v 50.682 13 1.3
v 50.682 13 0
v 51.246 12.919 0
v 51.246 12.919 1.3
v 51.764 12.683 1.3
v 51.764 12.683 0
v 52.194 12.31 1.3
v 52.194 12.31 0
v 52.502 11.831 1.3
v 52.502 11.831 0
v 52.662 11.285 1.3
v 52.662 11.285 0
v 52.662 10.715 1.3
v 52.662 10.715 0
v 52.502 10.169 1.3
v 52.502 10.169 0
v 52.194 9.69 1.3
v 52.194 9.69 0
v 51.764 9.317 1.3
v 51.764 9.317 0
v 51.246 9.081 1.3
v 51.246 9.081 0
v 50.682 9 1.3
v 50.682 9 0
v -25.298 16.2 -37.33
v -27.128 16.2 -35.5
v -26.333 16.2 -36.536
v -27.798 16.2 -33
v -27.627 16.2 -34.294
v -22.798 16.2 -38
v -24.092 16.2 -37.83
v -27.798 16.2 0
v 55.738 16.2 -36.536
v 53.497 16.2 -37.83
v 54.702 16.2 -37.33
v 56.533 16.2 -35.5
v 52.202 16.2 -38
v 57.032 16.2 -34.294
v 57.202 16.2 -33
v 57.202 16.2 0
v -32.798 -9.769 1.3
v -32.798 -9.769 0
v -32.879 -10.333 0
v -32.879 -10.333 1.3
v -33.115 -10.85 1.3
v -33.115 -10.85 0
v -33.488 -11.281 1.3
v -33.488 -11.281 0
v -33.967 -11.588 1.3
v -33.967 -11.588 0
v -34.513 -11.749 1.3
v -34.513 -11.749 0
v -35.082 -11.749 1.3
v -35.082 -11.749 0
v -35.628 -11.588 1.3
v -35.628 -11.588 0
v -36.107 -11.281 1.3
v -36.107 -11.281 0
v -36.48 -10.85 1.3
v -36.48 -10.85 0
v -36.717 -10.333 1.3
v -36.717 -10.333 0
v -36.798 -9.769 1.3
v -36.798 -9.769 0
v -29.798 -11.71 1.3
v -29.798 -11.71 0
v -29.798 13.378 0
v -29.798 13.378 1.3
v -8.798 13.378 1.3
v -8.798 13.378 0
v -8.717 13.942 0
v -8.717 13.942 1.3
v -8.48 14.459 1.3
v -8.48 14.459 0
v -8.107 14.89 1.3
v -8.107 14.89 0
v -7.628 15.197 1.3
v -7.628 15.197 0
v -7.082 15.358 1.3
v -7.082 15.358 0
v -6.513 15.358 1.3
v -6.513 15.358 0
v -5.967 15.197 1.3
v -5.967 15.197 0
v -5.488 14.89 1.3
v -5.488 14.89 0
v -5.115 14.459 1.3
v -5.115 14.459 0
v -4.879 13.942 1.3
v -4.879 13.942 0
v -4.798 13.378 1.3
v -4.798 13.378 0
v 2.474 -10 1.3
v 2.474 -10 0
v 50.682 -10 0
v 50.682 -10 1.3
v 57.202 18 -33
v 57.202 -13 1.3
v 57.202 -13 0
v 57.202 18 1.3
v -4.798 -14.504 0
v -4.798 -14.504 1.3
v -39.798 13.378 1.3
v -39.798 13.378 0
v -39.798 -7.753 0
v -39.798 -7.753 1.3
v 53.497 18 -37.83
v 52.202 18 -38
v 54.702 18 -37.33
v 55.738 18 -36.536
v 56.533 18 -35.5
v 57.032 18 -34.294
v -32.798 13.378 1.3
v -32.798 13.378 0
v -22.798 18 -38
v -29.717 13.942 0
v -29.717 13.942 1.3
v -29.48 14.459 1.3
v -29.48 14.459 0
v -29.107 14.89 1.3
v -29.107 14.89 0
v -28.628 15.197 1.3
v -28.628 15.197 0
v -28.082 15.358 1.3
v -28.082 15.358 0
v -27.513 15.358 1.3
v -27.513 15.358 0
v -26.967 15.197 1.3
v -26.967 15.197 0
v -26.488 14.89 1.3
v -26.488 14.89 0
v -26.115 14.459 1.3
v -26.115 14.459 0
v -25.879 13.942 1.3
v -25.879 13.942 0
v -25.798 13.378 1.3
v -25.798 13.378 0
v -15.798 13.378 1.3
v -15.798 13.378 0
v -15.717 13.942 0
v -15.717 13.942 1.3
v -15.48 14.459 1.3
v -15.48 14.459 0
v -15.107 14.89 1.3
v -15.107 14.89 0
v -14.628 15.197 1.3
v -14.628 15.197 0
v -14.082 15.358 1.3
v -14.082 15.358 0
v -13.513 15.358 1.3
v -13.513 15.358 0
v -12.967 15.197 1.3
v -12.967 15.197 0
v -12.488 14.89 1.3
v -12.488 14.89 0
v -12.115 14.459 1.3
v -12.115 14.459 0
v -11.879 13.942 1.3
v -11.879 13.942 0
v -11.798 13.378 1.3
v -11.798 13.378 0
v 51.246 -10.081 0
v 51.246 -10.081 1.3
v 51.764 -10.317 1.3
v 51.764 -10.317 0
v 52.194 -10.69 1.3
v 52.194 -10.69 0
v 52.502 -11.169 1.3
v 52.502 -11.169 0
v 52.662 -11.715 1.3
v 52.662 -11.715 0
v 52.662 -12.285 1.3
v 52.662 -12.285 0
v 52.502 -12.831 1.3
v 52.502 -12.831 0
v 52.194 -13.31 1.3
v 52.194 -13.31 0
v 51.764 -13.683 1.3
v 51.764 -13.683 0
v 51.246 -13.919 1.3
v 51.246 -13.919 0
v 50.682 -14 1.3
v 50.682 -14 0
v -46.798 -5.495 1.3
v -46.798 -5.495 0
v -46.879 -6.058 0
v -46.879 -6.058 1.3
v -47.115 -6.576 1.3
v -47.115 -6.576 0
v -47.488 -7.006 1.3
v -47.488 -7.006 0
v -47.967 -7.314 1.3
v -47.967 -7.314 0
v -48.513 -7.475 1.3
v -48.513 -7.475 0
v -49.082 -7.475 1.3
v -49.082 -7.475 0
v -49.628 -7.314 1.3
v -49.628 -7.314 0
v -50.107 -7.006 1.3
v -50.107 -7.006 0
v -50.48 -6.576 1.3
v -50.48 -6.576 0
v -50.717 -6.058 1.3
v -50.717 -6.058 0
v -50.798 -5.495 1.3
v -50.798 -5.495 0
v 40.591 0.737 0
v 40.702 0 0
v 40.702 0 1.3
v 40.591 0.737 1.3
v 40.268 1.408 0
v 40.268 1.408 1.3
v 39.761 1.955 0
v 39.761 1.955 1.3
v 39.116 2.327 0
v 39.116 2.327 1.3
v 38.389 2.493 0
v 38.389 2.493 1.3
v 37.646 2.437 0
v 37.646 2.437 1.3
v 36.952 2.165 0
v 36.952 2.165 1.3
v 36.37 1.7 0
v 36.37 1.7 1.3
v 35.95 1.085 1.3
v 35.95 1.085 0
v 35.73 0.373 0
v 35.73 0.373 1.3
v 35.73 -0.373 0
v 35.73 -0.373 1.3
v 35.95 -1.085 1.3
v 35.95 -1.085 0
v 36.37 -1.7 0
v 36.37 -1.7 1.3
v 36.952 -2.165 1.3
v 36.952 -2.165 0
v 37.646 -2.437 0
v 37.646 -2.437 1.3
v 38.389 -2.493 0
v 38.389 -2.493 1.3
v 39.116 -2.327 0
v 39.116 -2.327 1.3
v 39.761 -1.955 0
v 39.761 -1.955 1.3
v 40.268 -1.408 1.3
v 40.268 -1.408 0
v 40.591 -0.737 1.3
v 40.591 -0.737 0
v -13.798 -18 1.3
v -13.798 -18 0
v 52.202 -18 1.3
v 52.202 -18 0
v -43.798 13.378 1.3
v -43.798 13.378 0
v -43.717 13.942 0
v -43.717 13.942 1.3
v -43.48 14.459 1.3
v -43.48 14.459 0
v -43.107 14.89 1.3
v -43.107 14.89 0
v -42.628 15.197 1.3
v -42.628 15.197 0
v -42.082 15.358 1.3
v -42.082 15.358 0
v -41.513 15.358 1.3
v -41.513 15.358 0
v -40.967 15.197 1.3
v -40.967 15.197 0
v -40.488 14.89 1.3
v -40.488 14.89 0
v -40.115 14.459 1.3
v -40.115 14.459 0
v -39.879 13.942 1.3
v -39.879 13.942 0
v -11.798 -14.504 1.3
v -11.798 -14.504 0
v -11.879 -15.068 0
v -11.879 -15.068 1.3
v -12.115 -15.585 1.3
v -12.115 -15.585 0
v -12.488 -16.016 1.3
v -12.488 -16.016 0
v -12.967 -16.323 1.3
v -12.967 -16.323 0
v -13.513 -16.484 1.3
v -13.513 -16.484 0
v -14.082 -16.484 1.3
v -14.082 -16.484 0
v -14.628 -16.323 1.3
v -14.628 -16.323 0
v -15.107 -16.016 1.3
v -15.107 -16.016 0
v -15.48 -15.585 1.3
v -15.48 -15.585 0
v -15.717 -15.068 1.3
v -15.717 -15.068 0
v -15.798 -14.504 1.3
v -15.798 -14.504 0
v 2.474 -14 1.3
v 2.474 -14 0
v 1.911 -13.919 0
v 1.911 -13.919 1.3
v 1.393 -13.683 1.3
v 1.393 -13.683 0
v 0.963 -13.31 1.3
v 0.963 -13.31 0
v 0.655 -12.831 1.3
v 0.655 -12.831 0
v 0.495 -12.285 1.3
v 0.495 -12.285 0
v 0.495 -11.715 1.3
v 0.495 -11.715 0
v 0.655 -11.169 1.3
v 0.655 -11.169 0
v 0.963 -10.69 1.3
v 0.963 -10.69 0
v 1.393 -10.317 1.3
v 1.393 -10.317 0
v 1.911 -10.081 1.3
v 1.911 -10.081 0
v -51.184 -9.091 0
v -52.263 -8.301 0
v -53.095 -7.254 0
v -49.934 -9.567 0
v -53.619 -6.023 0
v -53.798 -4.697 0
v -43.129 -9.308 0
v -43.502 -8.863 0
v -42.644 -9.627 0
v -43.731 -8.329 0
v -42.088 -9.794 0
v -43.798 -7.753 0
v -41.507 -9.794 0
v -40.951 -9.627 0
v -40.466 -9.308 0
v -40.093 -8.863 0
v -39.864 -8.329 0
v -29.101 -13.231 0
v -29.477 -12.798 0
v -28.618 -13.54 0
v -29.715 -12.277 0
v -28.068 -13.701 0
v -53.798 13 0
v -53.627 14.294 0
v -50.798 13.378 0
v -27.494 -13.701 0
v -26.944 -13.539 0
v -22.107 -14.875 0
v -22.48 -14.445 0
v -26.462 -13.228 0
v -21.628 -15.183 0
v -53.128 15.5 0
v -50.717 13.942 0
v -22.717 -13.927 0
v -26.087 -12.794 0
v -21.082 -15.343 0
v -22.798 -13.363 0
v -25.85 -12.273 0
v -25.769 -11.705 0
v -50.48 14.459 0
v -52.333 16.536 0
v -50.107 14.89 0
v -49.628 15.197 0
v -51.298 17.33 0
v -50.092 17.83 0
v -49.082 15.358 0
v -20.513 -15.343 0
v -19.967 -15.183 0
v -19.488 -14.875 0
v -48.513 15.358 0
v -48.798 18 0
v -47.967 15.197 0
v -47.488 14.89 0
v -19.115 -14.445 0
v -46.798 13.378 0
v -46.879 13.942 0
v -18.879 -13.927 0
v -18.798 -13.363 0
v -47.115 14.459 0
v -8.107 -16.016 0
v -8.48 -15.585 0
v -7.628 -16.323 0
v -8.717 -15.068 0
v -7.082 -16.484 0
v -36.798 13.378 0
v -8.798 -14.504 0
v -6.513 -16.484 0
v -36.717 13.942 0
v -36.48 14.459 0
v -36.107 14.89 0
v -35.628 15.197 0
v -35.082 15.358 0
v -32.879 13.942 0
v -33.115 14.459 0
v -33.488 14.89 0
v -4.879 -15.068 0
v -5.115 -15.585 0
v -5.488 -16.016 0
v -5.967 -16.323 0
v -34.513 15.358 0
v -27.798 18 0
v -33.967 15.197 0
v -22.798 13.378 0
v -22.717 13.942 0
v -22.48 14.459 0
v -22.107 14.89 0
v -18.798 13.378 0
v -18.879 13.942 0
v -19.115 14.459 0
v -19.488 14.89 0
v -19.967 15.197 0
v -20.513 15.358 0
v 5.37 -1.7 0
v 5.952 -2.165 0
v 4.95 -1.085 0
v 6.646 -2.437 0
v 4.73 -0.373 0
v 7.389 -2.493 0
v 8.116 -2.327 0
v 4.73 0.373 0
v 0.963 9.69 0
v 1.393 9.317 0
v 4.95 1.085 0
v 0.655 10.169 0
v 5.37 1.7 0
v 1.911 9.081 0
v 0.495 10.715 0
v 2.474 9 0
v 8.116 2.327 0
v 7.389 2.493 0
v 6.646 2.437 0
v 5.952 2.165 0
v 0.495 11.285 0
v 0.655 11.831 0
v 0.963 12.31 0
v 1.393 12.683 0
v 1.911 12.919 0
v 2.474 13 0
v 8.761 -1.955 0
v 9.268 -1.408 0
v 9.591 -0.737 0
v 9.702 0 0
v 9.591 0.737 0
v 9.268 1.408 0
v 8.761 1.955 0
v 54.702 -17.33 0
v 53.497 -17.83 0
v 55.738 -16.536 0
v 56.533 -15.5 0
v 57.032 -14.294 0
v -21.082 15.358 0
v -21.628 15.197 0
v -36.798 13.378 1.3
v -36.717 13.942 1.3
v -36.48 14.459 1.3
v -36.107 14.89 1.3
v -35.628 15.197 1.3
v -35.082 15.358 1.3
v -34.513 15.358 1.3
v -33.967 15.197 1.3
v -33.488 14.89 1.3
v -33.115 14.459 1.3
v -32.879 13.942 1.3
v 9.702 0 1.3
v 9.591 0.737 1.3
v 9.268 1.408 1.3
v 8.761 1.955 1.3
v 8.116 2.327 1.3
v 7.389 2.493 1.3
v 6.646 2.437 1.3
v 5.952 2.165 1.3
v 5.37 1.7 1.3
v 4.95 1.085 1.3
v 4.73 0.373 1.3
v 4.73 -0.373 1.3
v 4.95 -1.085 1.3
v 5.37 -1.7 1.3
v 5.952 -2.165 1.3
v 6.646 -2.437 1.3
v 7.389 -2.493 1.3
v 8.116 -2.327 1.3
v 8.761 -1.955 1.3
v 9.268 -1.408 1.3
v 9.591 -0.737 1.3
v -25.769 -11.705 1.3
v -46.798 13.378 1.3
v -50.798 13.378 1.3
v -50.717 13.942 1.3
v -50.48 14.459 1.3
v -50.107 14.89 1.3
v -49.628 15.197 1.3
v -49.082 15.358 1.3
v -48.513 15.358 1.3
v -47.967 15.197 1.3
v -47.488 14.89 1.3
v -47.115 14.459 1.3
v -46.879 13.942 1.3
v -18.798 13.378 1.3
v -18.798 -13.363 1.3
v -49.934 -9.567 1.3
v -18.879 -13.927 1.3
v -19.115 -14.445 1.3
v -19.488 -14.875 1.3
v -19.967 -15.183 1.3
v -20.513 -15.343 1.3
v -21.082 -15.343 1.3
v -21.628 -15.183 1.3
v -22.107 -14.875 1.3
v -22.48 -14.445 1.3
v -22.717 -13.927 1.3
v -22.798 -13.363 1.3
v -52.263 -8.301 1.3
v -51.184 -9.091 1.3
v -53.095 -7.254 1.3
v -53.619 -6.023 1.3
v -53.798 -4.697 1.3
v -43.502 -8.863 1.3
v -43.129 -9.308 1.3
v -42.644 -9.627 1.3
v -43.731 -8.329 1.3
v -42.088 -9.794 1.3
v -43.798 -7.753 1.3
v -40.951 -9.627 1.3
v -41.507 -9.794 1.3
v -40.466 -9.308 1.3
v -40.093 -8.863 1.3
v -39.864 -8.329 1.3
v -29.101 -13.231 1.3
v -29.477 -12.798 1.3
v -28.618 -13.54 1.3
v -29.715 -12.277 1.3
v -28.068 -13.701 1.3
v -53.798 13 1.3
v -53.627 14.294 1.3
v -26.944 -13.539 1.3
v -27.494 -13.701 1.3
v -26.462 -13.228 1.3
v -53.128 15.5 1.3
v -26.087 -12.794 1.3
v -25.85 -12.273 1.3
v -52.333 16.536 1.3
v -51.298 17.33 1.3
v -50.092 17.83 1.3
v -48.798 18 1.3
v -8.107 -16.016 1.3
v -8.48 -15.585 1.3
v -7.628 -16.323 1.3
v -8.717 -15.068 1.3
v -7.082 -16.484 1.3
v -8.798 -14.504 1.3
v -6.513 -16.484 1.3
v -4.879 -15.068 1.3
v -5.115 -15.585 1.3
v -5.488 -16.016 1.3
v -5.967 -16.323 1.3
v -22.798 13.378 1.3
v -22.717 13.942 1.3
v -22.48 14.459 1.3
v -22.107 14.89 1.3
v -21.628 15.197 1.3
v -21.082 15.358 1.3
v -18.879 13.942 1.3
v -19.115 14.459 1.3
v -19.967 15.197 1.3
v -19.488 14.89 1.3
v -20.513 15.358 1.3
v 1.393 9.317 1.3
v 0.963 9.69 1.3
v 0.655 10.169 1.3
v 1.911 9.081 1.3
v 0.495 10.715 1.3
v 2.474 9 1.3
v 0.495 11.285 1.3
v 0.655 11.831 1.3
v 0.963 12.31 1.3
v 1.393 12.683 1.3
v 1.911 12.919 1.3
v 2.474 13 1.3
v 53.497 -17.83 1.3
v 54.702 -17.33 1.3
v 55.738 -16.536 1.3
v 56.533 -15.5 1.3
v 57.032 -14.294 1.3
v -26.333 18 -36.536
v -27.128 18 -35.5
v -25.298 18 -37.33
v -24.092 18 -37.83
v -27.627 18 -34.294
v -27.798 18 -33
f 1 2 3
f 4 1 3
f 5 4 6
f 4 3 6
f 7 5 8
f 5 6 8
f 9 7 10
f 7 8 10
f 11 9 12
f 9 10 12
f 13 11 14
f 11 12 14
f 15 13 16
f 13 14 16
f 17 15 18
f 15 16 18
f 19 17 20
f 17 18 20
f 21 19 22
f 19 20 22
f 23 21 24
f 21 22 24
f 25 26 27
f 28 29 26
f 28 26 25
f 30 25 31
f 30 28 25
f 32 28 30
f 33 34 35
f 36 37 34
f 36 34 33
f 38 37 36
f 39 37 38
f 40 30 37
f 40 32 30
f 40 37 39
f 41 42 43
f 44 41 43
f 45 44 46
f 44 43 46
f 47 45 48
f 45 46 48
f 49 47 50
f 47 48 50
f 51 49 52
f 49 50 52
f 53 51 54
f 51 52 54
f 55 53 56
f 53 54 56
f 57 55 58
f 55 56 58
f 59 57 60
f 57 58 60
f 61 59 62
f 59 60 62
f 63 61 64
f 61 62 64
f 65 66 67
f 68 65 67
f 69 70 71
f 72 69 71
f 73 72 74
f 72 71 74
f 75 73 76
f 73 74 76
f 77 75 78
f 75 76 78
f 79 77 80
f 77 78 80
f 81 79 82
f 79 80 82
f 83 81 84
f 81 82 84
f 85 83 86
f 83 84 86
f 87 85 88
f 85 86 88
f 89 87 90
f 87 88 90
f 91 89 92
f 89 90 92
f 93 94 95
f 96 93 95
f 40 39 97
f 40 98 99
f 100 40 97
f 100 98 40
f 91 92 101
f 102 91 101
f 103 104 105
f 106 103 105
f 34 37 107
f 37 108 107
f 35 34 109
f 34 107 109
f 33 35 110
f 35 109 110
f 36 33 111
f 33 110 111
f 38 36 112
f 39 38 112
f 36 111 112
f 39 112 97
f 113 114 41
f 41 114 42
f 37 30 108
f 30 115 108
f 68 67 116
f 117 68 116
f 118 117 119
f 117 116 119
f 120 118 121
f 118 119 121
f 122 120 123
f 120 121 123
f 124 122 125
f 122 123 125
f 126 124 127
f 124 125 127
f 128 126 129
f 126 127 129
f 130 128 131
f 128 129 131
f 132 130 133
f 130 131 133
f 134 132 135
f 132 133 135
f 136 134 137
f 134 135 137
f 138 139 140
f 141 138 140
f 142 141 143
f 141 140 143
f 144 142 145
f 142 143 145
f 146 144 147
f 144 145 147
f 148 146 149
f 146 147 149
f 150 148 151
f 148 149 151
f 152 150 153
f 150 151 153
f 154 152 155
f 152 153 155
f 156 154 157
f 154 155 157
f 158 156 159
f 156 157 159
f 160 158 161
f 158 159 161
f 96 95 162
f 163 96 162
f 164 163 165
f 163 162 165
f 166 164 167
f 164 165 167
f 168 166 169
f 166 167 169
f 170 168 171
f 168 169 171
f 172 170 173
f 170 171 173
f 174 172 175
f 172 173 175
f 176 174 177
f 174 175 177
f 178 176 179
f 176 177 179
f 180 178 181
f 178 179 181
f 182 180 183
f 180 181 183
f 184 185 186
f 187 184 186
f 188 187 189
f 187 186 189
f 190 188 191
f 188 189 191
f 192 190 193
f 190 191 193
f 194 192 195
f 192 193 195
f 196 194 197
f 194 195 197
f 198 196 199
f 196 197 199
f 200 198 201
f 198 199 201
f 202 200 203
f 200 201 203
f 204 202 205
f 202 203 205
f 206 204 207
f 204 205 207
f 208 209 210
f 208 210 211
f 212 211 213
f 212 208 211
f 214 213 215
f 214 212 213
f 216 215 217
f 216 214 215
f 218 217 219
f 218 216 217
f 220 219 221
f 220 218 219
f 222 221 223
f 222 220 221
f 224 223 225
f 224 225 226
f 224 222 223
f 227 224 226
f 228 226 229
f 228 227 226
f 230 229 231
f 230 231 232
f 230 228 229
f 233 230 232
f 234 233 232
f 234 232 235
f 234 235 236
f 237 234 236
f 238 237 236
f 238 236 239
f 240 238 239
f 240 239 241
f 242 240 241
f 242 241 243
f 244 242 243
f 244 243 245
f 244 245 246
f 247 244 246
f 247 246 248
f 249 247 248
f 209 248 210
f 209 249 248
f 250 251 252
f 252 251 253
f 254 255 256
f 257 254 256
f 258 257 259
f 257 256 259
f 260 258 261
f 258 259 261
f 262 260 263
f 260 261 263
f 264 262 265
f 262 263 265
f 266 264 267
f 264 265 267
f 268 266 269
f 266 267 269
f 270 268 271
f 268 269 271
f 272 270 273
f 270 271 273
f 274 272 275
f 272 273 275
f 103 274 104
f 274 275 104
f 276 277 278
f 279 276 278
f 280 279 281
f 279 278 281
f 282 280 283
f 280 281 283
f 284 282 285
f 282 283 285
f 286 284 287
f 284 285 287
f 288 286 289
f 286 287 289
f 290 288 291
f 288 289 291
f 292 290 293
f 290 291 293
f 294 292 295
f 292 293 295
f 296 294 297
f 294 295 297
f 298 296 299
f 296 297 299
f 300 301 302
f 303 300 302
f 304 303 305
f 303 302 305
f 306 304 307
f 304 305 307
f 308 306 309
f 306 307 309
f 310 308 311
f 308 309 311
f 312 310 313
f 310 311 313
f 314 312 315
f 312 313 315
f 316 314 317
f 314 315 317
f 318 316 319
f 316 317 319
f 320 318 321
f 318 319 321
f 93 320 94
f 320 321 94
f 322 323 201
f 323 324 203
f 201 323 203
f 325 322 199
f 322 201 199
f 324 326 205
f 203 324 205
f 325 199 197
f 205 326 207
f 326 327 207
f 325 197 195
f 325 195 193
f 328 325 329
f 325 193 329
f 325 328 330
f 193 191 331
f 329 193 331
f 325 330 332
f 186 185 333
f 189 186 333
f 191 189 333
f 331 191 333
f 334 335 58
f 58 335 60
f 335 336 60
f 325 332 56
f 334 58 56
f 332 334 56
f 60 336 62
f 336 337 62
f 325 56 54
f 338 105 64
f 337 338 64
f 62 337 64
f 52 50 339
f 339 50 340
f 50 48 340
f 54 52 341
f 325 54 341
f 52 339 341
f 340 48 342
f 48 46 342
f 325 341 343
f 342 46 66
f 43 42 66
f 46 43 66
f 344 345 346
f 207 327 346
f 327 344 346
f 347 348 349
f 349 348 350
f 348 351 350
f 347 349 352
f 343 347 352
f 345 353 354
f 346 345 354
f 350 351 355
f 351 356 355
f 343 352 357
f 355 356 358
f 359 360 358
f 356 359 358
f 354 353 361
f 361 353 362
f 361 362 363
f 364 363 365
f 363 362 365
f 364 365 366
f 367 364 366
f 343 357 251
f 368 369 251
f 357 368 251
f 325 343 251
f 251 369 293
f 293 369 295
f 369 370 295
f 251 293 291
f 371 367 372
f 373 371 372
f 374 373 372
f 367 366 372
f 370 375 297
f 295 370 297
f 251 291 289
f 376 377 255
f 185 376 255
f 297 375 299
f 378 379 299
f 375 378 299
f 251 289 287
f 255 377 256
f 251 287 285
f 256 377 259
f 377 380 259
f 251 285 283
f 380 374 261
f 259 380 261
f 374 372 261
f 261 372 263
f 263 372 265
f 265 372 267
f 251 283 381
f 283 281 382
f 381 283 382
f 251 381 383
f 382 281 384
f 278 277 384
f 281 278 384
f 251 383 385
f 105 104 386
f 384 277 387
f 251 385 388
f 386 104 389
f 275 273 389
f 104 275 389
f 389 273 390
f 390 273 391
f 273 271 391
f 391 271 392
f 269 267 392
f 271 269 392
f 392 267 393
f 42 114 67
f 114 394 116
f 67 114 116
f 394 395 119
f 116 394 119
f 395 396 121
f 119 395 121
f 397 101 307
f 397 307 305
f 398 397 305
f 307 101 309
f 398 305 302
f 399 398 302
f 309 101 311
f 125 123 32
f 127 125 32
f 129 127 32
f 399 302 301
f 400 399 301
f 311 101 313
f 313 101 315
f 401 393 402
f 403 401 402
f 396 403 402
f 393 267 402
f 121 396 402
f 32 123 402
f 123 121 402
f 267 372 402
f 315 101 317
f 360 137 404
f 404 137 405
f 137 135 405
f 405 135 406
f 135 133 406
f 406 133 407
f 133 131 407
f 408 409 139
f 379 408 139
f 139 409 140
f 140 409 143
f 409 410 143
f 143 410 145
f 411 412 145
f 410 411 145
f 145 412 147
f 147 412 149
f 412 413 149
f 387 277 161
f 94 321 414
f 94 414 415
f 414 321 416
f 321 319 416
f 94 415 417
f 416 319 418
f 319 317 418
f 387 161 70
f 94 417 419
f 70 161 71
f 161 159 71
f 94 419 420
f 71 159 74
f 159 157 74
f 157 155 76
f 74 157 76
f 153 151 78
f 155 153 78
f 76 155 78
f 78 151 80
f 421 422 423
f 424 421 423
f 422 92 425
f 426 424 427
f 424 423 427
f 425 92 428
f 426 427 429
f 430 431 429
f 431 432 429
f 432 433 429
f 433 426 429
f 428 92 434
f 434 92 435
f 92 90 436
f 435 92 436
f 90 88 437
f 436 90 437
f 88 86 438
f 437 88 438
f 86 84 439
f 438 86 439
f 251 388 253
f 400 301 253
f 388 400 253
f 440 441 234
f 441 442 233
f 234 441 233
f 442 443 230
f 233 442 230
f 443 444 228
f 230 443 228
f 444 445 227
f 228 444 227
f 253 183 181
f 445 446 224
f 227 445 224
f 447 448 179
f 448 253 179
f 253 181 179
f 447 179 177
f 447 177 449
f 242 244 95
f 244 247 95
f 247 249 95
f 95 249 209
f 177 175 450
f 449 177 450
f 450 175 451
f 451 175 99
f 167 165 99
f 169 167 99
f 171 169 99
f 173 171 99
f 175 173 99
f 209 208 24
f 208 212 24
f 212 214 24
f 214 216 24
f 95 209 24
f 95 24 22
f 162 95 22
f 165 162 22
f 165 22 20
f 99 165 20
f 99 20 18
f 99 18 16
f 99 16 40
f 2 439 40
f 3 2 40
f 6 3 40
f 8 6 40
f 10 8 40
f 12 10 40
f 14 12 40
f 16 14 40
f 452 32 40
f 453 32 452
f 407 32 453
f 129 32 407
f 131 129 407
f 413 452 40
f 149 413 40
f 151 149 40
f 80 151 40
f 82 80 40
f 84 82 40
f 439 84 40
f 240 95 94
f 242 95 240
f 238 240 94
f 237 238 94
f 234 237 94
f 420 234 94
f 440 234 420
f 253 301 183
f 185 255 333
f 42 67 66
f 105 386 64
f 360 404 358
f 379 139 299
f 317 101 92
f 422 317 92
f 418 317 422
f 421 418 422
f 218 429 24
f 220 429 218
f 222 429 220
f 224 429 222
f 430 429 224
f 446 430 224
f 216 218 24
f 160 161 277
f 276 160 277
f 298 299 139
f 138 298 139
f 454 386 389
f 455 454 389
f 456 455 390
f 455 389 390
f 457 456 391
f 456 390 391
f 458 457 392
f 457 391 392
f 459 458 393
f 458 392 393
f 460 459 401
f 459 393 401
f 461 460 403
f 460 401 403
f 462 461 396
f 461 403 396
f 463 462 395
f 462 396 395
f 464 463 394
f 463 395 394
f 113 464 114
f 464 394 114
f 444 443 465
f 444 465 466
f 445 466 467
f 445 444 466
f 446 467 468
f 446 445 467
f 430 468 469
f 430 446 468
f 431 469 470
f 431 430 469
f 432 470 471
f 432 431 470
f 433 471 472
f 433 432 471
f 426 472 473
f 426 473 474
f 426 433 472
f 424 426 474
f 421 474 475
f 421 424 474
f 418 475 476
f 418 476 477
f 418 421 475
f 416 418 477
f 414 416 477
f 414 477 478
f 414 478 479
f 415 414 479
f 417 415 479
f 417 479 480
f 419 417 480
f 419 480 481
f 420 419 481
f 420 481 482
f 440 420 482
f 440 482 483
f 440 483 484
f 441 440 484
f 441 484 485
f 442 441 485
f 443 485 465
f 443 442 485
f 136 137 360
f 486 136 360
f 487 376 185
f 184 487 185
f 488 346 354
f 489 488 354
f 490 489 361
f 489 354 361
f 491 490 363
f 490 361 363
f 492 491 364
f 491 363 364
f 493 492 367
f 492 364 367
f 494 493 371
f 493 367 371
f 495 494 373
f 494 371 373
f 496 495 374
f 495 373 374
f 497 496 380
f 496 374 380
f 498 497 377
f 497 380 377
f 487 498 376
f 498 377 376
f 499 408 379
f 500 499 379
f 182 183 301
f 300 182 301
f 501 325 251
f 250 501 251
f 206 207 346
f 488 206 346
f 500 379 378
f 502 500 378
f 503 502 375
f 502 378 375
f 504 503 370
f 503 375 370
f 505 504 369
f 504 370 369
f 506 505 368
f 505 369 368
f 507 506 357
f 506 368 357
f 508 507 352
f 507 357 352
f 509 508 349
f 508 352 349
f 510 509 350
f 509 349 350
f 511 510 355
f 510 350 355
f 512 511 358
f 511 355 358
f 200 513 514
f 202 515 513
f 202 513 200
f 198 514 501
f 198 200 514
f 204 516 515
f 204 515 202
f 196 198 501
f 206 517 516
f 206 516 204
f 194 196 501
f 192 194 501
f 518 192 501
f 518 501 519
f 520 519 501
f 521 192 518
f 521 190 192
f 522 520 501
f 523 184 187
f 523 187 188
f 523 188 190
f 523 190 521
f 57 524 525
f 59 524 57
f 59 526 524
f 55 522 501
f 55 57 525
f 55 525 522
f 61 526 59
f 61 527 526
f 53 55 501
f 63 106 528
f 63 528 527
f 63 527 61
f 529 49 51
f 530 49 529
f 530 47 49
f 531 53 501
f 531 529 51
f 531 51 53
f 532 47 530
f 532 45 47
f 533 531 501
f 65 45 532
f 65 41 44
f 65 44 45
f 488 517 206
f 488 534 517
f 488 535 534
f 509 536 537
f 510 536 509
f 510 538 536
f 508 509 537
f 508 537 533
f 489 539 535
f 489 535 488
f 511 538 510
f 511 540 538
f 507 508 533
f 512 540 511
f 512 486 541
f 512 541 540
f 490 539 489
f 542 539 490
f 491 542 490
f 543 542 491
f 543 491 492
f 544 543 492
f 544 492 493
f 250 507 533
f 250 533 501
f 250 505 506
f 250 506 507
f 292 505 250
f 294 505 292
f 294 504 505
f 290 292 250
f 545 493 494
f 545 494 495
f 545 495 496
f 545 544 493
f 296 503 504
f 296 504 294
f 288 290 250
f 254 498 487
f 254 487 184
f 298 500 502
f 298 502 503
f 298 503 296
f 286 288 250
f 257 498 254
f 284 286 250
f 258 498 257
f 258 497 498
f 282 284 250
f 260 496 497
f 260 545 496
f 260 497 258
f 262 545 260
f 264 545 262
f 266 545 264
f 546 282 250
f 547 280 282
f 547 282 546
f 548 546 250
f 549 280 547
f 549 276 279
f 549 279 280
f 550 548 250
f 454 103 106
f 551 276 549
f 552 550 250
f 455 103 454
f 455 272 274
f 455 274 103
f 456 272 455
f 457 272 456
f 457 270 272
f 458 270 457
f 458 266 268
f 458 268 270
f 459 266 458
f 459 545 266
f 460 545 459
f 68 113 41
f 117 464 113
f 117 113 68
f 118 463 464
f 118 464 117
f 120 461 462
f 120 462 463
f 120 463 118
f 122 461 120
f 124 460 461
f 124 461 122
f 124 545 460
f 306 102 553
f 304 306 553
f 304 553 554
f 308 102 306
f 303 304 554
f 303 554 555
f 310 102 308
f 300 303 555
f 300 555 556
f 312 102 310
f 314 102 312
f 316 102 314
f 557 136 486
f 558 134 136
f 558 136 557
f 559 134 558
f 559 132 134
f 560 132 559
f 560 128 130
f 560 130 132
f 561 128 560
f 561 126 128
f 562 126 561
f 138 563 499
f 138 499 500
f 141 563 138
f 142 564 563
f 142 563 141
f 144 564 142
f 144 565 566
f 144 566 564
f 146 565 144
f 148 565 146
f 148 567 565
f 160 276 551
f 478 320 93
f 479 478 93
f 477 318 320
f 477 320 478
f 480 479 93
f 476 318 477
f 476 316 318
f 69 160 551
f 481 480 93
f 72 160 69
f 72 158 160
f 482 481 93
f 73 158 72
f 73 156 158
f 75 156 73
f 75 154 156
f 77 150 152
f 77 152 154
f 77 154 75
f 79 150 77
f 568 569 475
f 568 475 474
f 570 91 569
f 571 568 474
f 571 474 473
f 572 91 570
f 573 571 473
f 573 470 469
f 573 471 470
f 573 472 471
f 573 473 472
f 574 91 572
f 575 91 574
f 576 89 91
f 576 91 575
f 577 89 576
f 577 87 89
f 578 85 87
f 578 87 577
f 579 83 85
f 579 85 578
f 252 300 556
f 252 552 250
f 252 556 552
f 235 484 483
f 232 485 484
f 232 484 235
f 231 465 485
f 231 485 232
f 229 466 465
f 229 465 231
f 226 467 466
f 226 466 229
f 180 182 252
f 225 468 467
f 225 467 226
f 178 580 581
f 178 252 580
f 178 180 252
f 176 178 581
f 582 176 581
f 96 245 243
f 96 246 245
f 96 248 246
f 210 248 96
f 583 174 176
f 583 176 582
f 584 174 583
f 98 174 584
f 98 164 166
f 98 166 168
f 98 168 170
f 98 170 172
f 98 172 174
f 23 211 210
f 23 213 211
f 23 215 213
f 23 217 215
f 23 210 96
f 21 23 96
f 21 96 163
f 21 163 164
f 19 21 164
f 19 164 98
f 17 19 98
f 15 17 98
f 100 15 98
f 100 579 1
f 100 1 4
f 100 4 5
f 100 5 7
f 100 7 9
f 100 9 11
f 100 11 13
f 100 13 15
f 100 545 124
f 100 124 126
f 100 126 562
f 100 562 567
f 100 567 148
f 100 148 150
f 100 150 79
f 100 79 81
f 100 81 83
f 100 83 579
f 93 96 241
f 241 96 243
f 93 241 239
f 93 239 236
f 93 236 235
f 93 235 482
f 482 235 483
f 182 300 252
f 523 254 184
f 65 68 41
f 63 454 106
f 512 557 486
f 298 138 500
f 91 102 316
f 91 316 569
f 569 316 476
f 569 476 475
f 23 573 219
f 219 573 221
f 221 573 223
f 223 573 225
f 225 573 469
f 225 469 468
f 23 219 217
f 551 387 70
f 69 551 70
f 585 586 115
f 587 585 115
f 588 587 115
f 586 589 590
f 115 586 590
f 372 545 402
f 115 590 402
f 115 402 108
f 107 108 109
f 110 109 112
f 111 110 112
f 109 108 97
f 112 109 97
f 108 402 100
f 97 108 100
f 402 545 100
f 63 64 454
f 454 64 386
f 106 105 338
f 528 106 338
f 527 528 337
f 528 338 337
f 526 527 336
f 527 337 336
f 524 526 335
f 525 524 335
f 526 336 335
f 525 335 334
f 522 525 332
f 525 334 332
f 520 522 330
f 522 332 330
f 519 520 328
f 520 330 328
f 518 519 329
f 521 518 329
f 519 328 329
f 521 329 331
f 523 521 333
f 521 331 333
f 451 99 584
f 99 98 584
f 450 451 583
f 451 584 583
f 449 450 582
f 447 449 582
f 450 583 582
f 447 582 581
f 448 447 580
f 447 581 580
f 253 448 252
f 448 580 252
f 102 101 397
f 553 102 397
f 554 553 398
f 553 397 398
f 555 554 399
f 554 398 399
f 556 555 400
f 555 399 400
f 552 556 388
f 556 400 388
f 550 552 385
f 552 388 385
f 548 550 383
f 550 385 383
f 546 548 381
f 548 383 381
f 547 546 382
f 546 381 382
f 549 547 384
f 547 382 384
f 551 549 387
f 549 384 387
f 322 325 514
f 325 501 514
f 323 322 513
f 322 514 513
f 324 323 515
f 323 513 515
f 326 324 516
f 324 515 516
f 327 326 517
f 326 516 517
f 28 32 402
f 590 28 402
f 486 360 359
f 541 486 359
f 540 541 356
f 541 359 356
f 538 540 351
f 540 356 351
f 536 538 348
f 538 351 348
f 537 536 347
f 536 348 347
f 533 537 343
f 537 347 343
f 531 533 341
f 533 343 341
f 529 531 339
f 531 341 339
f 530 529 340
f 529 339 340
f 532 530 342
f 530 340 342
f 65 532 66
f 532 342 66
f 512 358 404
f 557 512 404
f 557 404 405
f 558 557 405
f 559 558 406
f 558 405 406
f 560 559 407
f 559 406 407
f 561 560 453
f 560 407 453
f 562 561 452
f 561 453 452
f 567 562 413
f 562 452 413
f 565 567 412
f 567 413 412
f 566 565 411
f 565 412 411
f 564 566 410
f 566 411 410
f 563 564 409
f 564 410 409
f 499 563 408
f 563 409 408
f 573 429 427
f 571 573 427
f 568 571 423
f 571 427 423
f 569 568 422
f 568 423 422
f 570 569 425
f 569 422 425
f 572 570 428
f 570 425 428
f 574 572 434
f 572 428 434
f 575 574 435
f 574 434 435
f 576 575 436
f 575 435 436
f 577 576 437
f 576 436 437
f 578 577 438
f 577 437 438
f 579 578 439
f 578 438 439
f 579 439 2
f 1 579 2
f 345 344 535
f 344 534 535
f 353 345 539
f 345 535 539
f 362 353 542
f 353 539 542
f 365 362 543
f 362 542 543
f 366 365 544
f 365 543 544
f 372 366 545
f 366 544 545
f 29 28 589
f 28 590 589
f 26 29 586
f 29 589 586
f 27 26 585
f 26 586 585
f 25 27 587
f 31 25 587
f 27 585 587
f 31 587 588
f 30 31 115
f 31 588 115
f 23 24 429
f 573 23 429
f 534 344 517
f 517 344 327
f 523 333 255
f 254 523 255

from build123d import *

# Parameters (mm, degrees)
F0_R     = 2.5
F0_W     = 85
F0_H     = 1.8
F1_DEPTH = 1.3
F2_DEPTH = 38
F3_R     = 5


with BuildPart() as f1:
    # F0 (on Top) → F1 (new body)
    with BuildSketch(Plane.XY):
        Polygon((-27.797528, 18), (-53.797528, 18), (-53.797528, -8.664937), (-13.797528, -18), (57.202472, -18), (57.202472, 16.2), (-27.797528, 16.2), align=None)
        with BuildLine():
            Line((-15.797528, -9.769044), (-15.797528, 13.37813))
            ThreePointArc((-15.797528, 13.37813), (-13.797528, 15.37813), (-11.797528, 13.37813))
            Line((-11.797528, 13.37813), (-11.797528, -14.504098))
            ThreePointArc((-11.797528, -14.504098), (-13.797528, -16.504098), (-15.797528, -14.504098))
            Line((-15.797528, -14.504098), (-15.797528, -9.769044))
        make_face(mode=Mode.SUBTRACT)
        with BuildLine():
            Line((-8.797528, -14.504098), (-8.797528, 13.37813))
            ThreePointArc((-8.797528, 13.37813), (-6.797528, 15.37813), (-4.797528, 13.37813))
            Line((-4.797528, 13.37813), (-4.797528, -14.504098))
            ThreePointArc((-4.797528, -14.504098), (-6.797528, -16.504098), (-8.797528, -14.504098))
        make_face(mode=Mode.SUBTRACT)
        with BuildLine():
            ThreePointArc((50.682452, -10), (52.682452, -12), (50.682452, -14))
            Line((50.682452, -14), (2.474277, -14))
            ThreePointArc((2.474277, -14), (0.474277, -12), (2.474277, -10))
            Line((2.474277, -10), (50.682452, -10))
        make_face(mode=Mode.SUBTRACT)
        with BuildLine():
            Line((-50.797528, -5.494929), (-50.797528, 13.37813))
            ThreePointArc((-50.797528, 13.37813), (-48.797528, 15.37813), (-46.797528, 13.37813))
            Line((-46.797528, 13.37813), (-46.797528, -5.494929))
            ThreePointArc((-46.797528, -5.494929), (-48.797528, -7.494929), (-50.797528, -5.494929))
        make_face(mode=Mode.SUBTRACT)
        with BuildLine():
            Line((-43.797528, -7.752692), (-43.797528, 13.37813))
            ThreePointArc((-43.797528, 13.37813), (-41.797528, 15.37813), (-39.797528, 13.37813))
            Line((-39.797528, 13.37813), (-39.797528, -7.752692))
            ThreePointArc((-39.797528, -7.752692), (-41.797528, -9.815282), (-43.797528, -7.752692))
        make_face(mode=Mode.SUBTRACT)
        with BuildLine():
            Line((-36.797528, -9.769044), (-36.797528, 13.37813))
            ThreePointArc((-36.797528, 13.37813), (-34.797528, 15.37813), (-32.797528, 13.37813))
            Line((-32.797528, 13.37813), (-32.797528, -9.769044))
            ThreePointArc((-32.797528, -9.769044), (-34.797528, -11.769044), (-36.797528, -9.769044))
        make_face(mode=Mode.SUBTRACT)
        with BuildLine():
            ThreePointArc((-29.797528, 13.37813), (-27.797528, 15.37813), (-25.797528, 13.37813))
            Line((-25.797528, 13.37813), (-25.768946, -11.704986))
            ThreePointArc((-25.768946, -11.704986), (-27.780942, -13.721572), (-29.797528, -11.709576))
            Line((-29.797528, -11.709576), (-29.797528, 13.37813))
        make_face(mode=Mode.SUBTRACT)
        with BuildLine():
            ThreePointArc((-22.797528, 13.37813), (-20.797528, 15.37813), (-18.797528, 13.37813))
            Line((-18.797528, 13.37813), (-18.797528, -13.363477))
            ThreePointArc((-18.797528, -13.363477), (-20.797528, -15.363477), (-22.797528, -13.363477))
            Line((-22.797528, -13.363477), (-22.797528, 13.37813))
        make_face(mode=Mode.SUBTRACT)
        with Locations((7.202472, 0)):
            Circle(F0_R, mode=Mode.SUBTRACT)
        with Locations((38.202472, 0)):
            Circle(F0_R, mode=Mode.SUBTRACT)
        with BuildLine():
            ThreePointArc((2.474277, 9), (0.474277, 11), (2.474277, 13))
            Line((2.474277, 13), (50.682452, 13))
            ThreePointArc((50.682452, 13), (52.682452, 11), (50.682452, 9))
            Line((50.682452, 9), (2.474277, 9))
        make_face(mode=Mode.SUBTRACT)
        with Locations((14.702472, 17.1)):
            Rectangle(F0_W, F0_H)
    extrude(amount=F1_DEPTH)

    # F0 (on Top) → F2 (join)
    with BuildSketch(Plane.XY):
        with Locations((14.702472, 17.1)):
            Rectangle(F0_W, F0_H)
    extrude(amount=-F2_DEPTH)

    # F3
    f3_edges = [f1.edges().sort_by_distance(p)[0] for p in [
        (-53.797528, 18, 0.65),
        (-53.797528, -8.664937, 0.65),
        (57.202472, -18, 0.65),
        (57.202472, 17.1, -38),
        (-27.797528, 17.1, -38),
    ]]
    fillet(f3_edges, radius=F3_R)


solid = f1.part
